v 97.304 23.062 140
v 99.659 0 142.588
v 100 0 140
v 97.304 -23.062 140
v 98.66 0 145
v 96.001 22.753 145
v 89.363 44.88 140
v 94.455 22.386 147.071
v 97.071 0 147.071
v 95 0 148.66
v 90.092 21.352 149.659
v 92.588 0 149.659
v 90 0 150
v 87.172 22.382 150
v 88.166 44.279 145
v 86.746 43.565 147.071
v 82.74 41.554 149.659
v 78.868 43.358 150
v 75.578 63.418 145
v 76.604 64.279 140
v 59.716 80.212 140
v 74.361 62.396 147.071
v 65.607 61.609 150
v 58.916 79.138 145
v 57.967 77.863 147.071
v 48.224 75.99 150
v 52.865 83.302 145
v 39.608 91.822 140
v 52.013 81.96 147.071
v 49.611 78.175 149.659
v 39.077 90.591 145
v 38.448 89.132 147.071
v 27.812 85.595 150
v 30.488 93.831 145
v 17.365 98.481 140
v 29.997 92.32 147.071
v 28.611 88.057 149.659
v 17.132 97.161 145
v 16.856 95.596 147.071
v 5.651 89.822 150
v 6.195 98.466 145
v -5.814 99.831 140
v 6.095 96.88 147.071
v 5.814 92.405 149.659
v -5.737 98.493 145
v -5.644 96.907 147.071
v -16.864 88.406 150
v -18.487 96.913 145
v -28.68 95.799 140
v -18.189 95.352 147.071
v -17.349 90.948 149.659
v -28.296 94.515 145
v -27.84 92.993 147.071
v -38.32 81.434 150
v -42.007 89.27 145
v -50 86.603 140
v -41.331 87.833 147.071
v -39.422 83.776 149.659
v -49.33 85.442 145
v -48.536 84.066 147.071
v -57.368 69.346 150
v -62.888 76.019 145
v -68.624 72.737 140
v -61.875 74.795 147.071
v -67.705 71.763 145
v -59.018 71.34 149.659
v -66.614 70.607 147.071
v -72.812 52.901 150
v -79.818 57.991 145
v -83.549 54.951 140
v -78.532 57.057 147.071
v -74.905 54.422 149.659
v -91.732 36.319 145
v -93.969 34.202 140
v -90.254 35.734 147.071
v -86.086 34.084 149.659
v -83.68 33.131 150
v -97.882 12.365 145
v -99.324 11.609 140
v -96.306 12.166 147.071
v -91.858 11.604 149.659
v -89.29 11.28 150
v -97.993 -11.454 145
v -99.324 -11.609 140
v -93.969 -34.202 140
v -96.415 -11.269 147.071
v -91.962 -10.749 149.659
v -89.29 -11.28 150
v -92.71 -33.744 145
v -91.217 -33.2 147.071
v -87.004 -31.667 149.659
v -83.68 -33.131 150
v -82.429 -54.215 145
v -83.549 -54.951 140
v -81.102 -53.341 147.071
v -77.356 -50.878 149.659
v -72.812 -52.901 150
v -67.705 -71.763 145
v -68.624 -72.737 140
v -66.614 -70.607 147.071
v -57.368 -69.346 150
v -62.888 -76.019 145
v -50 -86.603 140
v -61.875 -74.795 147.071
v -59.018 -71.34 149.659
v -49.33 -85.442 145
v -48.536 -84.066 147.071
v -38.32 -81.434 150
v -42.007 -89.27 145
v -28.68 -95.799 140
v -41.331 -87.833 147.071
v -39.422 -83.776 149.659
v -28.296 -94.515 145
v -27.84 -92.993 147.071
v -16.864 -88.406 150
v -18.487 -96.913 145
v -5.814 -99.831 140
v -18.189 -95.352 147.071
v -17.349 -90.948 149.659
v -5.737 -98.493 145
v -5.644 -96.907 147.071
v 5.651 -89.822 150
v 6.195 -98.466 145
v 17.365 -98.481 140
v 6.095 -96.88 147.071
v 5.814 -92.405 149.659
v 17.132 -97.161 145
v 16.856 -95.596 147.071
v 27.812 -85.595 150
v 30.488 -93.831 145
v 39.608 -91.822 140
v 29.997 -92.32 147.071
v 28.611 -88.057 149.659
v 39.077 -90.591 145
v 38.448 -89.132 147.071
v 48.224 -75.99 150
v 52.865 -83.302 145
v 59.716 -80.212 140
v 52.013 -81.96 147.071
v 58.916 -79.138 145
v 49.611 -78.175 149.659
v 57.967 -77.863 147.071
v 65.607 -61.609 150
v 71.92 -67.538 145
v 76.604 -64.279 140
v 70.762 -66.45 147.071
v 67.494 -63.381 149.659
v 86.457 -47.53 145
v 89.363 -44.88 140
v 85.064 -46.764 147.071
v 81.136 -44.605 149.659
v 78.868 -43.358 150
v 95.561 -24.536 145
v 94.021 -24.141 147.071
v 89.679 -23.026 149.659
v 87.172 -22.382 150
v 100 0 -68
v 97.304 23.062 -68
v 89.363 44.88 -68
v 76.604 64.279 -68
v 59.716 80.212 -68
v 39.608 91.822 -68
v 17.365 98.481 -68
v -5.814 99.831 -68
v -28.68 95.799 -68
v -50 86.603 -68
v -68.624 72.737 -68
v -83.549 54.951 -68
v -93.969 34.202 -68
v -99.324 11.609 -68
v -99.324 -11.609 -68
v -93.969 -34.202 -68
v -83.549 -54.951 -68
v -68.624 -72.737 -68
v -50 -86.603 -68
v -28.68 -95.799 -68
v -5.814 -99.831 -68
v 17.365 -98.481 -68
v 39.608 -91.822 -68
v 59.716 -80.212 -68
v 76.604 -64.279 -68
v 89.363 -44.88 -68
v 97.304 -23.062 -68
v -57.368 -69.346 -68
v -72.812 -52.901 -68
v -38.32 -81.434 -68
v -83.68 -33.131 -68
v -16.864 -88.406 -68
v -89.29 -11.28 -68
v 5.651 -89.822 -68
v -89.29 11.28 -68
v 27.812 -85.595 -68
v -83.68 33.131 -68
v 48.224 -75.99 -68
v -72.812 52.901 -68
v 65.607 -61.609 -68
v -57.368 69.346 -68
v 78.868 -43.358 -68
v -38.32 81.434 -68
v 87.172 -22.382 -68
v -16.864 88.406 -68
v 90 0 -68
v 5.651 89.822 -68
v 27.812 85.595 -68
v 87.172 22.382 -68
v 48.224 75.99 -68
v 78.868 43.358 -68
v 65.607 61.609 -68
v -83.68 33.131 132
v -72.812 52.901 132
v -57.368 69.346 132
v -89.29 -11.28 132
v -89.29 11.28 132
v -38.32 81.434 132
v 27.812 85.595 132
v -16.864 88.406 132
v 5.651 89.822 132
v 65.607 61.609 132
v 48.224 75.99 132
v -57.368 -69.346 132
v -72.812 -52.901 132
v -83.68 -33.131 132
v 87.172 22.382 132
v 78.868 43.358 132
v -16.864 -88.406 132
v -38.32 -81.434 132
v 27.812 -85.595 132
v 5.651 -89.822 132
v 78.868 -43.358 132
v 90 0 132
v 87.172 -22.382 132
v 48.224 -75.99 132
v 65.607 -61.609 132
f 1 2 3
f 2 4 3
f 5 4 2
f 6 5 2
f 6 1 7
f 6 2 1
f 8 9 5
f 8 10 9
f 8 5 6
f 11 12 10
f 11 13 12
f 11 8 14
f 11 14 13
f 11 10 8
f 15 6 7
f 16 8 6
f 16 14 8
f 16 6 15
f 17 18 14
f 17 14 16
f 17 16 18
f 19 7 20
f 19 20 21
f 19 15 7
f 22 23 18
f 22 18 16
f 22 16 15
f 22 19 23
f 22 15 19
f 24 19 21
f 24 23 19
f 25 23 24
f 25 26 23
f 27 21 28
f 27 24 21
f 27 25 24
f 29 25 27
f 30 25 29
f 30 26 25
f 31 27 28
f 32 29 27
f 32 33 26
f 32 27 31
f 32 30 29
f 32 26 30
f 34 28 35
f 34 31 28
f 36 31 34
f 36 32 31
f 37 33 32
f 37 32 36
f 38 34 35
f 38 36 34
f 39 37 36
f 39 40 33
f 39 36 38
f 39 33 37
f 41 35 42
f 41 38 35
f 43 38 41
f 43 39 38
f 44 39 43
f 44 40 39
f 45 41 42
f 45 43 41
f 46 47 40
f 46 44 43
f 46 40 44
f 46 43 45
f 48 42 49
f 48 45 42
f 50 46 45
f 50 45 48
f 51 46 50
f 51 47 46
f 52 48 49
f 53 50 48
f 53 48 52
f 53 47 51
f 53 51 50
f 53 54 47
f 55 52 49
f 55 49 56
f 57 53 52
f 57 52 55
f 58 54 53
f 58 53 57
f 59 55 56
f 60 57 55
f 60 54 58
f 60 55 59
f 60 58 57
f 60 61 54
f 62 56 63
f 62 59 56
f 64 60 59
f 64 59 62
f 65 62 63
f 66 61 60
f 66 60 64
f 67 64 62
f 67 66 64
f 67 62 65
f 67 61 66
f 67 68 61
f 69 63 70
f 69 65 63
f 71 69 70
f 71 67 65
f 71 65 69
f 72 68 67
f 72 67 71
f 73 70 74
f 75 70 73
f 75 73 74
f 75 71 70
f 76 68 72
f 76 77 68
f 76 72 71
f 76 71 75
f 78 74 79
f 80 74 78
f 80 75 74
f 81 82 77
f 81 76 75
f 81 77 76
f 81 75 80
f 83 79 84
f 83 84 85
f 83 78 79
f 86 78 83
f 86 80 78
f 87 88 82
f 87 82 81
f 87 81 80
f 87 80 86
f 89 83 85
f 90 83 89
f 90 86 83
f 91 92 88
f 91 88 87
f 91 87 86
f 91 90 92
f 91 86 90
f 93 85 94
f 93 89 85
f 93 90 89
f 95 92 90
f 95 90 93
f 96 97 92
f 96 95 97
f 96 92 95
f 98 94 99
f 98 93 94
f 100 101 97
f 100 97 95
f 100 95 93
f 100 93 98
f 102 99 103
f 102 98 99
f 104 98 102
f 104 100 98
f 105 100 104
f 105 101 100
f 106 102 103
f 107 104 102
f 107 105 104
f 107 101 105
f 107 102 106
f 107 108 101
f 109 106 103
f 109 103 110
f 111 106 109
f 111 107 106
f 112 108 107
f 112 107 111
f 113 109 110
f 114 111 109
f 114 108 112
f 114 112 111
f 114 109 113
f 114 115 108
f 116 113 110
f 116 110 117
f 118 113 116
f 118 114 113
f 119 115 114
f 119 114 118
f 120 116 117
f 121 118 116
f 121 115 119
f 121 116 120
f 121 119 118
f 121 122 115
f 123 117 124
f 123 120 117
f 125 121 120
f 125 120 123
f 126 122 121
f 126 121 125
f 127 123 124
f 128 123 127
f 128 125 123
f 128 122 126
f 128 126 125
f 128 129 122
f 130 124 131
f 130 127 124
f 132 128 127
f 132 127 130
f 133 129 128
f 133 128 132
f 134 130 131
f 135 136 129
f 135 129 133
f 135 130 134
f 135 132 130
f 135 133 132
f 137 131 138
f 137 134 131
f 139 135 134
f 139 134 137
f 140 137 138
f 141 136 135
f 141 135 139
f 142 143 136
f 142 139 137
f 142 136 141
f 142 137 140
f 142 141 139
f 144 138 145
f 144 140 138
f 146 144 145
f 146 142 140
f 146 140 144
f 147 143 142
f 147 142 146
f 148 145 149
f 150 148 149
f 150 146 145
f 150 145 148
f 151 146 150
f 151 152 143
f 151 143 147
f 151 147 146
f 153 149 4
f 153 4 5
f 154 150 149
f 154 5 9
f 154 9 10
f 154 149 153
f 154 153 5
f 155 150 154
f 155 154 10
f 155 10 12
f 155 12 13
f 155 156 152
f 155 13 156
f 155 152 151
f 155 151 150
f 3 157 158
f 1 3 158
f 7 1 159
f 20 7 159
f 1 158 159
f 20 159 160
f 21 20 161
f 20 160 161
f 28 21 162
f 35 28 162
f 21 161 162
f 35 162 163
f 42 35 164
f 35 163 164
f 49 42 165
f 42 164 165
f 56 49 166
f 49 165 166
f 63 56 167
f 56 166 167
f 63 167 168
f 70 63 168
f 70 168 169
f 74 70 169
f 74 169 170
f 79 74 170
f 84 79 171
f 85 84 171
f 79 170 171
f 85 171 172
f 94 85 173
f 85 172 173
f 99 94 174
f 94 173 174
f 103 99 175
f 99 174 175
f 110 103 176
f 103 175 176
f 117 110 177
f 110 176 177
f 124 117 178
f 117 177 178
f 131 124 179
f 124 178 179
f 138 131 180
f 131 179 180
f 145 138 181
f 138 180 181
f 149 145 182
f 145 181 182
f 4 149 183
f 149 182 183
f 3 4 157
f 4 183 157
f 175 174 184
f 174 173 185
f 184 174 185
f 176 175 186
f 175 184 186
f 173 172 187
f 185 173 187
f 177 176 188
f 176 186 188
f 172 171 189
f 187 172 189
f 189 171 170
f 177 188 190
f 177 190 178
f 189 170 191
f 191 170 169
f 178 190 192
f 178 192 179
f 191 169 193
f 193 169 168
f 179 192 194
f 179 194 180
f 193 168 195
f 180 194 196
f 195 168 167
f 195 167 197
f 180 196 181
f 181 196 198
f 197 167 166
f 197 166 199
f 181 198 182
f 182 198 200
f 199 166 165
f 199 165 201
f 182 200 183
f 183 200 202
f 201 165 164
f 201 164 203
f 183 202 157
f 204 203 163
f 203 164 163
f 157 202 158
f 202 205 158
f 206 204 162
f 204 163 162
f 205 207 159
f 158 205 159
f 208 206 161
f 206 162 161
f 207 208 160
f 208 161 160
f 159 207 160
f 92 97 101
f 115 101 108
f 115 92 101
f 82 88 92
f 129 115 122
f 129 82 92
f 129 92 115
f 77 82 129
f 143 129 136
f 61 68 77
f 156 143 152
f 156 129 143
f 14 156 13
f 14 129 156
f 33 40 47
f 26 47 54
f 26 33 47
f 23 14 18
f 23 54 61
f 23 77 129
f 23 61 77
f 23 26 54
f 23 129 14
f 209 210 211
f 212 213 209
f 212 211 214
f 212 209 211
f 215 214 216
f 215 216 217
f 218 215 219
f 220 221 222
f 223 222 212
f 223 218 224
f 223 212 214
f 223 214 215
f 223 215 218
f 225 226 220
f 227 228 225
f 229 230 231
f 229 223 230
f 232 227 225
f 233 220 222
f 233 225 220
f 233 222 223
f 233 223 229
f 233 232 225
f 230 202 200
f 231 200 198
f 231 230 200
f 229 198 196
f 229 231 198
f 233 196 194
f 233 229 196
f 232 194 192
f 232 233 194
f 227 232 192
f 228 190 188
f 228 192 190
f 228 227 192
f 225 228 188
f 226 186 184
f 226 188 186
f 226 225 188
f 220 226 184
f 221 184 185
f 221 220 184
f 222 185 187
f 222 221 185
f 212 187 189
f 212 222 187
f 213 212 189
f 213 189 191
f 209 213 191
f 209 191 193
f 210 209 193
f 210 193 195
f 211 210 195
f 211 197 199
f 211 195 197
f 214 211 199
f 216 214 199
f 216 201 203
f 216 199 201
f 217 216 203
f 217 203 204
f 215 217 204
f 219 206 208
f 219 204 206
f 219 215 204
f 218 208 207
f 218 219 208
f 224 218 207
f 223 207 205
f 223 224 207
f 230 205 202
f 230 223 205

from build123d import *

# Parameters (mm, degrees)
BOSS_EXTRUDE1_DEPTH      = 150
BOSS_EXTRUDE1_DEPTH_BACK = 68
SKETCH2_R                = 100
CUT_EXTRUDE1_DEPTH       = 20
CUT_EXTRUDE1_DEPTH_BACK  = 200
SKETCH6_R                = 90
FILLET1_R                = 10


with BuildPart() as part:
    # Sketch2 → Boss-Extrude1 (new, two sides: drawn at the far end of the back side and taken through both)
    with BuildSketch(Plane.XY.offset(-BOSS_EXTRUDE1_DEPTH_BACK)):
        Circle(SKETCH2_R)
    extrude(amount=BOSS_EXTRUDE1_DEPTH + BOSS_EXTRUDE1_DEPTH_BACK)

    # Sketch6 → Cut-Extrude1 (cut, two sides: drawn at the far end of the back side and taken through both)
    with BuildSketch(Plane(origin=(0, 0, -68), x_dir=(-1, 0, 0), z_dir=(0, 0, -1)).offset(-CUT_EXTRUDE1_DEPTH_BACK)):
        with Locations(Location((0, 0, 0), (0, 0, 180))):
            Circle(SKETCH6_R)
    extrude(amount=CUT_EXTRUDE1_DEPTH + CUT_EXTRUDE1_DEPTH_BACK, mode=Mode.SUBTRACT)

    # Fillet1
    fillet1_edges = [part.edges().sort_by_distance(p)[0] for p in [
        (-100, 0, 150),
    ]]
    fillet(fillet1_edges, radius=FILLET1_R)


solid = part.part
